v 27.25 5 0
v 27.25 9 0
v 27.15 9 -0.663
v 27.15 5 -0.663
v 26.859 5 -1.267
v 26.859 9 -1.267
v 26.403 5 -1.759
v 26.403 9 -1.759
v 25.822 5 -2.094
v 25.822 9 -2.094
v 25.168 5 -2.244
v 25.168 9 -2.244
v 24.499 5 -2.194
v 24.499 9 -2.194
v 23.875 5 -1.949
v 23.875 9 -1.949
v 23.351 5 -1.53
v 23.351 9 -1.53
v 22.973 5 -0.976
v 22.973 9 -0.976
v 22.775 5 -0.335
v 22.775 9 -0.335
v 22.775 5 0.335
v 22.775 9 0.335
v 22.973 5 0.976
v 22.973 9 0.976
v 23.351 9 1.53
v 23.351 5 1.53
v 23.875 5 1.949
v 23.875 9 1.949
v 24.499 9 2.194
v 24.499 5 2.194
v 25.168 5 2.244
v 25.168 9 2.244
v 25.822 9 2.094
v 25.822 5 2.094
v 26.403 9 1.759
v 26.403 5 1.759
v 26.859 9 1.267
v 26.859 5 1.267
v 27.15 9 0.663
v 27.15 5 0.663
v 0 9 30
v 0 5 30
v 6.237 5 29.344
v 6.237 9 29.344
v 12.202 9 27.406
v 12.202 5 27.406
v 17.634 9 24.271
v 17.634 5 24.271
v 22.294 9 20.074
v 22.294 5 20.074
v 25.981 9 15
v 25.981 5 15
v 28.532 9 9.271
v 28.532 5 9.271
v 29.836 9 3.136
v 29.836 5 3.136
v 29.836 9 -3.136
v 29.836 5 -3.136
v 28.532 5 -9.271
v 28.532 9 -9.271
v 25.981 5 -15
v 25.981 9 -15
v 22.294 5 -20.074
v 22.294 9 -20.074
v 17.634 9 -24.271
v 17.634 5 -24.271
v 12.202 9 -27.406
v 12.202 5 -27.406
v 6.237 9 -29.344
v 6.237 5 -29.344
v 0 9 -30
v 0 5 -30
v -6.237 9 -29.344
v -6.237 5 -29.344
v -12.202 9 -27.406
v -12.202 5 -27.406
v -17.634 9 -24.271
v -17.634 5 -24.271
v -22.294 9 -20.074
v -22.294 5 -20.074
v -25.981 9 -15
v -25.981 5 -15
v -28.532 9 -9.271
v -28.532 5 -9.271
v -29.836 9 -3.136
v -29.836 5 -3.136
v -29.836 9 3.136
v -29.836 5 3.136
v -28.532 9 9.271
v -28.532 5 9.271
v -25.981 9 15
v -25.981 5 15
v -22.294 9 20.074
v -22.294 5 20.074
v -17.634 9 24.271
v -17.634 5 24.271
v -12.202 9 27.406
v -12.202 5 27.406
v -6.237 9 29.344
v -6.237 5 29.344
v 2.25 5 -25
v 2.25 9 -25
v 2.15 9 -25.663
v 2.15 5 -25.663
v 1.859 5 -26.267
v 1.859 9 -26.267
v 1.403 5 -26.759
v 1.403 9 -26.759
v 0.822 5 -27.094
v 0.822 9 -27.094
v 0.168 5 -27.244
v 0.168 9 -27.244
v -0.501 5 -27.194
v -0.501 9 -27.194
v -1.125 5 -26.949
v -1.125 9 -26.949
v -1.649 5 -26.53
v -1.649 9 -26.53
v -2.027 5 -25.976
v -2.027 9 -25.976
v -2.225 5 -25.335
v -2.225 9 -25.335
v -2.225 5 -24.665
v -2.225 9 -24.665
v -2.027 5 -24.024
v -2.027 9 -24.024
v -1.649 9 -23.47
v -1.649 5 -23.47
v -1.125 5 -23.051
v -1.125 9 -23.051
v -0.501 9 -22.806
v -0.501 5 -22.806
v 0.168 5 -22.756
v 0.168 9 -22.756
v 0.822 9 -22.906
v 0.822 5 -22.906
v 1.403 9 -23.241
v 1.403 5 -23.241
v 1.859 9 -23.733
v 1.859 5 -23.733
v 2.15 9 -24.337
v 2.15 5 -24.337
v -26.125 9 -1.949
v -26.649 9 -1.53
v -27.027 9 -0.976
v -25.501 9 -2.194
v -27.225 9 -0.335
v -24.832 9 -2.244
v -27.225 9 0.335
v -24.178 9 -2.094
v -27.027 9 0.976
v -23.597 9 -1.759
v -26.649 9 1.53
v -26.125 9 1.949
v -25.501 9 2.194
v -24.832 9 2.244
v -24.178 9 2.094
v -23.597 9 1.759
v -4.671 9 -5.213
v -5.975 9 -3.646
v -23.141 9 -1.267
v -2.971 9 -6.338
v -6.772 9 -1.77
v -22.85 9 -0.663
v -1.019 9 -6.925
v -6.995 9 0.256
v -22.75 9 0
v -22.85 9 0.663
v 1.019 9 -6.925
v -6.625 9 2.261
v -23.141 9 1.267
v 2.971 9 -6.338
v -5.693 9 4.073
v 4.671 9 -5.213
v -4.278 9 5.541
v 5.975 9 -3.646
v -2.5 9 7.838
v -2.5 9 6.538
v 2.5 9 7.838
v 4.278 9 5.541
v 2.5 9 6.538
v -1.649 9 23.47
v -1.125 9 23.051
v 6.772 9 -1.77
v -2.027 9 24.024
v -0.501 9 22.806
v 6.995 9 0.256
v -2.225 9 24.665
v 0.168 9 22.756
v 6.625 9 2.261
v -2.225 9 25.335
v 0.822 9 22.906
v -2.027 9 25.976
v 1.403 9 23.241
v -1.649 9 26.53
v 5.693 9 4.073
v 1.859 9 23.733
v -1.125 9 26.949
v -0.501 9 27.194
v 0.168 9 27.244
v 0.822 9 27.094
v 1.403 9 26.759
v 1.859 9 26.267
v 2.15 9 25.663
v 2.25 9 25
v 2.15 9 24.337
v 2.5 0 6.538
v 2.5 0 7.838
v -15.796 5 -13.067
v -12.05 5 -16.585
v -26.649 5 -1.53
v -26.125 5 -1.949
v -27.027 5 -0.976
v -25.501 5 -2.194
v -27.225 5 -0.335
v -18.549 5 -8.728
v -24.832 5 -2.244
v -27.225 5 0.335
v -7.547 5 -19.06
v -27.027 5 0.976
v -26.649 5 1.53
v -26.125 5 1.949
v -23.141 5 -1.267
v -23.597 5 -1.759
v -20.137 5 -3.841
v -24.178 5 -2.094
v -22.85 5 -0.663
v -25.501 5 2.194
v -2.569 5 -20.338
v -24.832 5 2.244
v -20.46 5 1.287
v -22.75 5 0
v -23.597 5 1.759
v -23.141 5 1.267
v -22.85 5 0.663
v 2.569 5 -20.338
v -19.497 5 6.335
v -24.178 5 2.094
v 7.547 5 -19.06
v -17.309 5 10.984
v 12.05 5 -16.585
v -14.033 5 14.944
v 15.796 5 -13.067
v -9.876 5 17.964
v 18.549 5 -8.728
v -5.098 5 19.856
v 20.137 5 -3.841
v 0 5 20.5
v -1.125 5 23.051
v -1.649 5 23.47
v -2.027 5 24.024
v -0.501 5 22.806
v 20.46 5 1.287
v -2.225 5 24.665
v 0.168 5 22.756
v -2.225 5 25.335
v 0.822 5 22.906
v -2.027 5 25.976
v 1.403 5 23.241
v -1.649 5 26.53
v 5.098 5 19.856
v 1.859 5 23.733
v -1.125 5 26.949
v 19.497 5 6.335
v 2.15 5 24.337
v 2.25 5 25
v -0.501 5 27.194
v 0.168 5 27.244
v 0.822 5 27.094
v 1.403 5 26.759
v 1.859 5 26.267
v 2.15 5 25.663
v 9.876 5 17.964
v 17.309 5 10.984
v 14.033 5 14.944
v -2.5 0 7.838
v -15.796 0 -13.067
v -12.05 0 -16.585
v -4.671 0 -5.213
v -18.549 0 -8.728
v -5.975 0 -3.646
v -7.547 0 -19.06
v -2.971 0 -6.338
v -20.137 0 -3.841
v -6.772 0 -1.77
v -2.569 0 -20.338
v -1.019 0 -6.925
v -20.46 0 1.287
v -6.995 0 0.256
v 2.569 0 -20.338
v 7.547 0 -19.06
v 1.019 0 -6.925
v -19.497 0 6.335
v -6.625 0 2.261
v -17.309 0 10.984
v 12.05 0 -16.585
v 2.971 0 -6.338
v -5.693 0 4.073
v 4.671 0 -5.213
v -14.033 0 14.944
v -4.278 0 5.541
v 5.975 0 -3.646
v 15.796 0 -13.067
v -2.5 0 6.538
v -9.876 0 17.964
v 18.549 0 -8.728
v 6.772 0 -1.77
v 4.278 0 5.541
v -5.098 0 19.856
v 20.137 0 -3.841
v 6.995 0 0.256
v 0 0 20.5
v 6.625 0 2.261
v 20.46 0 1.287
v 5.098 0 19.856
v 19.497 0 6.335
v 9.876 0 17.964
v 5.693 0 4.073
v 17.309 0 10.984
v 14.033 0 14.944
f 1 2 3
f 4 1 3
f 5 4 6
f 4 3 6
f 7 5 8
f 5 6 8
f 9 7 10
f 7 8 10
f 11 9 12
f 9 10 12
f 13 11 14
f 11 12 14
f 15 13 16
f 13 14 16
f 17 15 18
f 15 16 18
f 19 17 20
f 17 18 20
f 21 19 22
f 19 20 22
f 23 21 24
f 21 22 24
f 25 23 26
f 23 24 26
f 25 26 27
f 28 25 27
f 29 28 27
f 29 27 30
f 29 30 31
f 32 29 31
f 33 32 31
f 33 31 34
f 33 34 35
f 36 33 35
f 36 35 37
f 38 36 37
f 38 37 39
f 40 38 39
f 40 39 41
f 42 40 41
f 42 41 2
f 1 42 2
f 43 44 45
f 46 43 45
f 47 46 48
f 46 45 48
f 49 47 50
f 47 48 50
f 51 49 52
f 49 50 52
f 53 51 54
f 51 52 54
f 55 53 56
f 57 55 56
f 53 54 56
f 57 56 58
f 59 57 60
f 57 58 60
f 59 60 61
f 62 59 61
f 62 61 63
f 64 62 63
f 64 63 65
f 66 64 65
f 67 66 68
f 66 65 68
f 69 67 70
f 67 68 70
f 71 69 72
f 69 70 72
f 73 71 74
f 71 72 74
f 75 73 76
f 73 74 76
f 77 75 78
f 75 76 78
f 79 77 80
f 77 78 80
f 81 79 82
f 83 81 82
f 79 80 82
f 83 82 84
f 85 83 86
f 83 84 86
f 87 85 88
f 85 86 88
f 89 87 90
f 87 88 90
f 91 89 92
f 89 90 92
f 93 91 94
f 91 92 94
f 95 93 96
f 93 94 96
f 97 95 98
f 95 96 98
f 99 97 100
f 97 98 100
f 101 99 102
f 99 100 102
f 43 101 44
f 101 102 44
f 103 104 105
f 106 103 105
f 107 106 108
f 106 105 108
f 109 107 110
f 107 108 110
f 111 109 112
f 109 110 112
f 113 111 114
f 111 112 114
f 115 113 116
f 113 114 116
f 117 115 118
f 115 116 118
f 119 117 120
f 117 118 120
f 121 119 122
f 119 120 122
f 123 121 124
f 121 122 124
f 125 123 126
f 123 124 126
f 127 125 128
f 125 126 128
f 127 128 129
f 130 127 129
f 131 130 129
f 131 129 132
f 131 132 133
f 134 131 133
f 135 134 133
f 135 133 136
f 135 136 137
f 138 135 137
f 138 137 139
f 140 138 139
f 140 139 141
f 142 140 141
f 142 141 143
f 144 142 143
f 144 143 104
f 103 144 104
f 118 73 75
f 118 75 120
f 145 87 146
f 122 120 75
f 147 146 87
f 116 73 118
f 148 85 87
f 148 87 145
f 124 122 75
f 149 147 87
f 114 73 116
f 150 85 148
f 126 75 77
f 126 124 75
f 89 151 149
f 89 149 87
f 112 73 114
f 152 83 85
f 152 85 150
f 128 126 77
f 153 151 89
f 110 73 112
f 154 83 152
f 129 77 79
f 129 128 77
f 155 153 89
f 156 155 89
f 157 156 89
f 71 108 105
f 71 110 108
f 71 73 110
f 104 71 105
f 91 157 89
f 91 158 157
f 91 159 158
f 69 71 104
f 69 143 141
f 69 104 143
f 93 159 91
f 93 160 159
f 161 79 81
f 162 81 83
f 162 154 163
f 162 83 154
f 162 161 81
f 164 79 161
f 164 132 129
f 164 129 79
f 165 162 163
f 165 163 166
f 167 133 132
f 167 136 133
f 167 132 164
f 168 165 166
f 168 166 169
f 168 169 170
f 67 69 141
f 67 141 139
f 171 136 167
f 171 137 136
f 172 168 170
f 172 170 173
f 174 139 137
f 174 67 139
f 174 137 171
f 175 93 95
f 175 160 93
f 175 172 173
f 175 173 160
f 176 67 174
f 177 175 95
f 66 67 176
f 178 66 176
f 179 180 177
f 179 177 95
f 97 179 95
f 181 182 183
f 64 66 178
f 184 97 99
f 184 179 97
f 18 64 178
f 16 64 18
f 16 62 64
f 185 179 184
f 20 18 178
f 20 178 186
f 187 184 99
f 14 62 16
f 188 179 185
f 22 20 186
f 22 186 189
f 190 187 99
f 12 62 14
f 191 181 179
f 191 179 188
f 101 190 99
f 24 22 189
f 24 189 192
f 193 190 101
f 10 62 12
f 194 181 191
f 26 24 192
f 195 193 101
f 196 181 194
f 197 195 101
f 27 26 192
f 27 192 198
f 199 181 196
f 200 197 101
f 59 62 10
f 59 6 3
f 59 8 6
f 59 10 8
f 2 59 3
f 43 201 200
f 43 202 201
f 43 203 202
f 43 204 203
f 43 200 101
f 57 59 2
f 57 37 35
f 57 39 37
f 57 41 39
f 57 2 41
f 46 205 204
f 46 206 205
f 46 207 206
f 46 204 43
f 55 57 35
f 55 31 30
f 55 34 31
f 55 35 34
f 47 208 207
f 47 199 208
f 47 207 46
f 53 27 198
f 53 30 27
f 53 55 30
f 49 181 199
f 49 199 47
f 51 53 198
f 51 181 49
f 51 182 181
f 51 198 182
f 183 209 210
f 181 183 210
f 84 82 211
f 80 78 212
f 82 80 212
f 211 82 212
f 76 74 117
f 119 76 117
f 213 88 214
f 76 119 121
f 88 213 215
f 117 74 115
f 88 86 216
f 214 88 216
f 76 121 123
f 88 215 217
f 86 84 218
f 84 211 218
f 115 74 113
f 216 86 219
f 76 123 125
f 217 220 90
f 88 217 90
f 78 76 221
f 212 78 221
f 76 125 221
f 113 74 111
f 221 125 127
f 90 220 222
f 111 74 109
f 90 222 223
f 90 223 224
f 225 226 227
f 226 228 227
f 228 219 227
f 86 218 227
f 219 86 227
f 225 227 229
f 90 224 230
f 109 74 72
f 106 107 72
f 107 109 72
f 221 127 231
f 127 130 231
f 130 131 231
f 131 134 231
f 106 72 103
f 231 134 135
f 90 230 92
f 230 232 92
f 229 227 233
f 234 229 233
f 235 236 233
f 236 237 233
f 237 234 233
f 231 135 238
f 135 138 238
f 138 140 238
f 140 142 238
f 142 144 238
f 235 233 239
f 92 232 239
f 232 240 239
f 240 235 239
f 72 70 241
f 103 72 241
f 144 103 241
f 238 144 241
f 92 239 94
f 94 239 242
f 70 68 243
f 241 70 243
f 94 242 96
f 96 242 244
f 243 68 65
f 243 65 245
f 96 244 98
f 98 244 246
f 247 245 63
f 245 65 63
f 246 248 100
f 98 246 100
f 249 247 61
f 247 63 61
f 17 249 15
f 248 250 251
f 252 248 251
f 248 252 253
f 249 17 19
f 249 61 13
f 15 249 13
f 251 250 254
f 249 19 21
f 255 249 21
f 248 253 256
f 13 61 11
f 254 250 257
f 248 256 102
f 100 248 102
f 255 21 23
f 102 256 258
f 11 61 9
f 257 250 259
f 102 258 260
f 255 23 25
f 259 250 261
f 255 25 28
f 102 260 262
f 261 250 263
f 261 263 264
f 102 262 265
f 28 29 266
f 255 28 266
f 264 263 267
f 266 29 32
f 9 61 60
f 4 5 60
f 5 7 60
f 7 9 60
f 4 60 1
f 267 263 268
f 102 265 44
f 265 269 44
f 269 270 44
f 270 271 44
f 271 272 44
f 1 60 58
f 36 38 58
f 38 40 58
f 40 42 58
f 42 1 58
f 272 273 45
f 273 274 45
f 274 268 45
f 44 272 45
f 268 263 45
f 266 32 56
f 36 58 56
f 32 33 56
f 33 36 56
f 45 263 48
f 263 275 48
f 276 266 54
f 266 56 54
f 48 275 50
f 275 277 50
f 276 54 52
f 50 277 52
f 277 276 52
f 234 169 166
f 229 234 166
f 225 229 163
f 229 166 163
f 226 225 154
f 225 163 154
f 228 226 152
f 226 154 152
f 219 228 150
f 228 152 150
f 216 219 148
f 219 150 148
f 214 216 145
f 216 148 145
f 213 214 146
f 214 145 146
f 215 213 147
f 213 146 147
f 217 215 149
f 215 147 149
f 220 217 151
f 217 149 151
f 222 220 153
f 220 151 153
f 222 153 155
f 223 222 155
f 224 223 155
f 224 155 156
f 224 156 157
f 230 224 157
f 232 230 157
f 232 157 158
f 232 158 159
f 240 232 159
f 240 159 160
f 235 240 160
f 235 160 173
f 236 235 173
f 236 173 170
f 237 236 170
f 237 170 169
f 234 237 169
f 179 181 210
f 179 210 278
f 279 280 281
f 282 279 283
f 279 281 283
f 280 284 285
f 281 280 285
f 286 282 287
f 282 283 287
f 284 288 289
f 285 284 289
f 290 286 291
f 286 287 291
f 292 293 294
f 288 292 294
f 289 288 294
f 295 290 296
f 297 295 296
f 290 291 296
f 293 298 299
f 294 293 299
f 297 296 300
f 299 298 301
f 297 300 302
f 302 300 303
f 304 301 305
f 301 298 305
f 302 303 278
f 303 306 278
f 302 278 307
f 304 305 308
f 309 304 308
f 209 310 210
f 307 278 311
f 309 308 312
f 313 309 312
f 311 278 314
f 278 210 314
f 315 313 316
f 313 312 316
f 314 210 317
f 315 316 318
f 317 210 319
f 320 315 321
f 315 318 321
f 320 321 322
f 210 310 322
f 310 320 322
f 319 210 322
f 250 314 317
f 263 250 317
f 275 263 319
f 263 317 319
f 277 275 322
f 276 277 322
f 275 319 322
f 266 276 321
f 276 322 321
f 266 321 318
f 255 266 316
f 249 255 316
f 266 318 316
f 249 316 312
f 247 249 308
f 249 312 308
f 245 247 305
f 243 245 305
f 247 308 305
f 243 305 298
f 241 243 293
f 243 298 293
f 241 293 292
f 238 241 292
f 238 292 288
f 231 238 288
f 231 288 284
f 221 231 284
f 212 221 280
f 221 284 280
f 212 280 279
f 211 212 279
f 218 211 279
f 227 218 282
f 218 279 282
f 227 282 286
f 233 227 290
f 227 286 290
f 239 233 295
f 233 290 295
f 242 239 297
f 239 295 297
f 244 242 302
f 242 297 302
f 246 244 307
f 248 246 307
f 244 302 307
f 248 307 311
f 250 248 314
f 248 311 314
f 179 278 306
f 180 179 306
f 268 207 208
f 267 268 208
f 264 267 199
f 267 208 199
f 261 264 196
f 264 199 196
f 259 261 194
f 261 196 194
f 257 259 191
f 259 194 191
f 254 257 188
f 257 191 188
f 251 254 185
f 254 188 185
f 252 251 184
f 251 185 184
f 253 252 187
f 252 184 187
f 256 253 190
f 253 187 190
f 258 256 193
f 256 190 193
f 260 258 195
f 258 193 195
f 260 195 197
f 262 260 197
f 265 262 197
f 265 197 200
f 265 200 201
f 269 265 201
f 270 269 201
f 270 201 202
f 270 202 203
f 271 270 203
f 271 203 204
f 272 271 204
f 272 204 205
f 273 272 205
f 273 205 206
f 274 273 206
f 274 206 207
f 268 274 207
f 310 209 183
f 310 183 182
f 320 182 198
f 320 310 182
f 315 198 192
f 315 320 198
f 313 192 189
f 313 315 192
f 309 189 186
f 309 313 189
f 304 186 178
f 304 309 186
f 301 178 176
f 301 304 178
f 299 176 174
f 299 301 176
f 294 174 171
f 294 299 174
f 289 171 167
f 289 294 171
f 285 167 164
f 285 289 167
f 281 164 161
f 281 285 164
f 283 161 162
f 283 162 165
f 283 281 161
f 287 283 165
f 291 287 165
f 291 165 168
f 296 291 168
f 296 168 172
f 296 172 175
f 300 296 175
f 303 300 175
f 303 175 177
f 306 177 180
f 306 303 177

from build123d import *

# Parameters (mm, degrees)
SKIZZE1_R                            = 20.5
SKIZZE1_R_2                          = 7
AUFSATZ_LINEAR_AUSTRAGEN1_DEPTH      = 5
SKIZZE3_R                            = 30
SKIZZE3_R_2                          = 7
AUFSATZ_LINEAR_AUSTRAGEN2_DEPTH      = 4
DURCHGANGSLOCH_F_R_M41_D             = 4.5
SCHNITT_LINEAR_AUSTRAGEN1_DEPTH      = 44.370496884
SCHNITT_LINEAR_AUSTRAGEN1_DEPTH_BACK = 44.370496884


with BuildPart() as part:
    # Skizze1 → Aufsatz-Linear austragen1 (new body)
    with BuildSketch(Plane(origin=(0, 0, 0), x_dir=(1, 0, 0), z_dir=(0, 1, 0))):
        with Locations(Location((0, 0, 0), (0, 0, 270))):
            Circle(SKIZZE1_R)
        with Locations(Location((0, 0, 0), (0, 0, 270))):
            Circle(SKIZZE1_R_2, mode=Mode.SUBTRACT)
    extrude(amount=AUFSATZ_LINEAR_AUSTRAGEN1_DEPTH)

    # Skizze3 → Aufsatz-Linear austragen2 (add)
    with BuildSketch(Plane(origin=(0, 5, 0), x_dir=(1, 0, 0), z_dir=(0, 1, 0))):
        with Locations(Location((0, 0, 0), (0, 0, 270))):
            Circle(SKIZZE3_R)
        with Locations(Location((0, 0, 0), (0, 0, 270))):
            Circle(SKIZZE3_R_2, mode=Mode.SUBTRACT)
    extrude(amount=AUFSATZ_LINEAR_AUSTRAGEN2_DEPTH)

    # Durchgangsloch für M41 (through all)
    with Locations(Plane(origin=(0, 5, 0), x_dir=(-1, 0, 0), z_dir=(0, -1, 0))):
        with Locations((0, 25), (-25, 0), (0, -25), (25, 0)):
            Hole(DURCHGANGSLOCH_F_R_M41_D / 2)

    # Skizze6 → Schnitt-Linear austragen1 (cut, two sides: drawn at the far end of the back side and taken through both)
    with BuildSketch(Plane.XZ.offset(-SCHNITT_LINEAR_AUSTRAGEN1_DEPTH_BACK)):
        with BuildLine():
            Line((2.5, 7.838348415), (-2.5, 7.838348415))
            Line((-2.5, 7.838348415), (-2.5, 6.538348415))
            ThreePointArc((-2.5, 6.538348415), (0, 7), (2.5, 6.538348415))
            Line((2.5, 6.538348415), (2.5, 7.838348415))
        make_face()
    extrude(amount=SCHNITT_LINEAR_AUSTRAGEN1_DEPTH + SCHNITT_LINEAR_AUSTRAGEN1_DEPTH_BACK, mode=Mode.SUBTRACT)


solid = part.part
